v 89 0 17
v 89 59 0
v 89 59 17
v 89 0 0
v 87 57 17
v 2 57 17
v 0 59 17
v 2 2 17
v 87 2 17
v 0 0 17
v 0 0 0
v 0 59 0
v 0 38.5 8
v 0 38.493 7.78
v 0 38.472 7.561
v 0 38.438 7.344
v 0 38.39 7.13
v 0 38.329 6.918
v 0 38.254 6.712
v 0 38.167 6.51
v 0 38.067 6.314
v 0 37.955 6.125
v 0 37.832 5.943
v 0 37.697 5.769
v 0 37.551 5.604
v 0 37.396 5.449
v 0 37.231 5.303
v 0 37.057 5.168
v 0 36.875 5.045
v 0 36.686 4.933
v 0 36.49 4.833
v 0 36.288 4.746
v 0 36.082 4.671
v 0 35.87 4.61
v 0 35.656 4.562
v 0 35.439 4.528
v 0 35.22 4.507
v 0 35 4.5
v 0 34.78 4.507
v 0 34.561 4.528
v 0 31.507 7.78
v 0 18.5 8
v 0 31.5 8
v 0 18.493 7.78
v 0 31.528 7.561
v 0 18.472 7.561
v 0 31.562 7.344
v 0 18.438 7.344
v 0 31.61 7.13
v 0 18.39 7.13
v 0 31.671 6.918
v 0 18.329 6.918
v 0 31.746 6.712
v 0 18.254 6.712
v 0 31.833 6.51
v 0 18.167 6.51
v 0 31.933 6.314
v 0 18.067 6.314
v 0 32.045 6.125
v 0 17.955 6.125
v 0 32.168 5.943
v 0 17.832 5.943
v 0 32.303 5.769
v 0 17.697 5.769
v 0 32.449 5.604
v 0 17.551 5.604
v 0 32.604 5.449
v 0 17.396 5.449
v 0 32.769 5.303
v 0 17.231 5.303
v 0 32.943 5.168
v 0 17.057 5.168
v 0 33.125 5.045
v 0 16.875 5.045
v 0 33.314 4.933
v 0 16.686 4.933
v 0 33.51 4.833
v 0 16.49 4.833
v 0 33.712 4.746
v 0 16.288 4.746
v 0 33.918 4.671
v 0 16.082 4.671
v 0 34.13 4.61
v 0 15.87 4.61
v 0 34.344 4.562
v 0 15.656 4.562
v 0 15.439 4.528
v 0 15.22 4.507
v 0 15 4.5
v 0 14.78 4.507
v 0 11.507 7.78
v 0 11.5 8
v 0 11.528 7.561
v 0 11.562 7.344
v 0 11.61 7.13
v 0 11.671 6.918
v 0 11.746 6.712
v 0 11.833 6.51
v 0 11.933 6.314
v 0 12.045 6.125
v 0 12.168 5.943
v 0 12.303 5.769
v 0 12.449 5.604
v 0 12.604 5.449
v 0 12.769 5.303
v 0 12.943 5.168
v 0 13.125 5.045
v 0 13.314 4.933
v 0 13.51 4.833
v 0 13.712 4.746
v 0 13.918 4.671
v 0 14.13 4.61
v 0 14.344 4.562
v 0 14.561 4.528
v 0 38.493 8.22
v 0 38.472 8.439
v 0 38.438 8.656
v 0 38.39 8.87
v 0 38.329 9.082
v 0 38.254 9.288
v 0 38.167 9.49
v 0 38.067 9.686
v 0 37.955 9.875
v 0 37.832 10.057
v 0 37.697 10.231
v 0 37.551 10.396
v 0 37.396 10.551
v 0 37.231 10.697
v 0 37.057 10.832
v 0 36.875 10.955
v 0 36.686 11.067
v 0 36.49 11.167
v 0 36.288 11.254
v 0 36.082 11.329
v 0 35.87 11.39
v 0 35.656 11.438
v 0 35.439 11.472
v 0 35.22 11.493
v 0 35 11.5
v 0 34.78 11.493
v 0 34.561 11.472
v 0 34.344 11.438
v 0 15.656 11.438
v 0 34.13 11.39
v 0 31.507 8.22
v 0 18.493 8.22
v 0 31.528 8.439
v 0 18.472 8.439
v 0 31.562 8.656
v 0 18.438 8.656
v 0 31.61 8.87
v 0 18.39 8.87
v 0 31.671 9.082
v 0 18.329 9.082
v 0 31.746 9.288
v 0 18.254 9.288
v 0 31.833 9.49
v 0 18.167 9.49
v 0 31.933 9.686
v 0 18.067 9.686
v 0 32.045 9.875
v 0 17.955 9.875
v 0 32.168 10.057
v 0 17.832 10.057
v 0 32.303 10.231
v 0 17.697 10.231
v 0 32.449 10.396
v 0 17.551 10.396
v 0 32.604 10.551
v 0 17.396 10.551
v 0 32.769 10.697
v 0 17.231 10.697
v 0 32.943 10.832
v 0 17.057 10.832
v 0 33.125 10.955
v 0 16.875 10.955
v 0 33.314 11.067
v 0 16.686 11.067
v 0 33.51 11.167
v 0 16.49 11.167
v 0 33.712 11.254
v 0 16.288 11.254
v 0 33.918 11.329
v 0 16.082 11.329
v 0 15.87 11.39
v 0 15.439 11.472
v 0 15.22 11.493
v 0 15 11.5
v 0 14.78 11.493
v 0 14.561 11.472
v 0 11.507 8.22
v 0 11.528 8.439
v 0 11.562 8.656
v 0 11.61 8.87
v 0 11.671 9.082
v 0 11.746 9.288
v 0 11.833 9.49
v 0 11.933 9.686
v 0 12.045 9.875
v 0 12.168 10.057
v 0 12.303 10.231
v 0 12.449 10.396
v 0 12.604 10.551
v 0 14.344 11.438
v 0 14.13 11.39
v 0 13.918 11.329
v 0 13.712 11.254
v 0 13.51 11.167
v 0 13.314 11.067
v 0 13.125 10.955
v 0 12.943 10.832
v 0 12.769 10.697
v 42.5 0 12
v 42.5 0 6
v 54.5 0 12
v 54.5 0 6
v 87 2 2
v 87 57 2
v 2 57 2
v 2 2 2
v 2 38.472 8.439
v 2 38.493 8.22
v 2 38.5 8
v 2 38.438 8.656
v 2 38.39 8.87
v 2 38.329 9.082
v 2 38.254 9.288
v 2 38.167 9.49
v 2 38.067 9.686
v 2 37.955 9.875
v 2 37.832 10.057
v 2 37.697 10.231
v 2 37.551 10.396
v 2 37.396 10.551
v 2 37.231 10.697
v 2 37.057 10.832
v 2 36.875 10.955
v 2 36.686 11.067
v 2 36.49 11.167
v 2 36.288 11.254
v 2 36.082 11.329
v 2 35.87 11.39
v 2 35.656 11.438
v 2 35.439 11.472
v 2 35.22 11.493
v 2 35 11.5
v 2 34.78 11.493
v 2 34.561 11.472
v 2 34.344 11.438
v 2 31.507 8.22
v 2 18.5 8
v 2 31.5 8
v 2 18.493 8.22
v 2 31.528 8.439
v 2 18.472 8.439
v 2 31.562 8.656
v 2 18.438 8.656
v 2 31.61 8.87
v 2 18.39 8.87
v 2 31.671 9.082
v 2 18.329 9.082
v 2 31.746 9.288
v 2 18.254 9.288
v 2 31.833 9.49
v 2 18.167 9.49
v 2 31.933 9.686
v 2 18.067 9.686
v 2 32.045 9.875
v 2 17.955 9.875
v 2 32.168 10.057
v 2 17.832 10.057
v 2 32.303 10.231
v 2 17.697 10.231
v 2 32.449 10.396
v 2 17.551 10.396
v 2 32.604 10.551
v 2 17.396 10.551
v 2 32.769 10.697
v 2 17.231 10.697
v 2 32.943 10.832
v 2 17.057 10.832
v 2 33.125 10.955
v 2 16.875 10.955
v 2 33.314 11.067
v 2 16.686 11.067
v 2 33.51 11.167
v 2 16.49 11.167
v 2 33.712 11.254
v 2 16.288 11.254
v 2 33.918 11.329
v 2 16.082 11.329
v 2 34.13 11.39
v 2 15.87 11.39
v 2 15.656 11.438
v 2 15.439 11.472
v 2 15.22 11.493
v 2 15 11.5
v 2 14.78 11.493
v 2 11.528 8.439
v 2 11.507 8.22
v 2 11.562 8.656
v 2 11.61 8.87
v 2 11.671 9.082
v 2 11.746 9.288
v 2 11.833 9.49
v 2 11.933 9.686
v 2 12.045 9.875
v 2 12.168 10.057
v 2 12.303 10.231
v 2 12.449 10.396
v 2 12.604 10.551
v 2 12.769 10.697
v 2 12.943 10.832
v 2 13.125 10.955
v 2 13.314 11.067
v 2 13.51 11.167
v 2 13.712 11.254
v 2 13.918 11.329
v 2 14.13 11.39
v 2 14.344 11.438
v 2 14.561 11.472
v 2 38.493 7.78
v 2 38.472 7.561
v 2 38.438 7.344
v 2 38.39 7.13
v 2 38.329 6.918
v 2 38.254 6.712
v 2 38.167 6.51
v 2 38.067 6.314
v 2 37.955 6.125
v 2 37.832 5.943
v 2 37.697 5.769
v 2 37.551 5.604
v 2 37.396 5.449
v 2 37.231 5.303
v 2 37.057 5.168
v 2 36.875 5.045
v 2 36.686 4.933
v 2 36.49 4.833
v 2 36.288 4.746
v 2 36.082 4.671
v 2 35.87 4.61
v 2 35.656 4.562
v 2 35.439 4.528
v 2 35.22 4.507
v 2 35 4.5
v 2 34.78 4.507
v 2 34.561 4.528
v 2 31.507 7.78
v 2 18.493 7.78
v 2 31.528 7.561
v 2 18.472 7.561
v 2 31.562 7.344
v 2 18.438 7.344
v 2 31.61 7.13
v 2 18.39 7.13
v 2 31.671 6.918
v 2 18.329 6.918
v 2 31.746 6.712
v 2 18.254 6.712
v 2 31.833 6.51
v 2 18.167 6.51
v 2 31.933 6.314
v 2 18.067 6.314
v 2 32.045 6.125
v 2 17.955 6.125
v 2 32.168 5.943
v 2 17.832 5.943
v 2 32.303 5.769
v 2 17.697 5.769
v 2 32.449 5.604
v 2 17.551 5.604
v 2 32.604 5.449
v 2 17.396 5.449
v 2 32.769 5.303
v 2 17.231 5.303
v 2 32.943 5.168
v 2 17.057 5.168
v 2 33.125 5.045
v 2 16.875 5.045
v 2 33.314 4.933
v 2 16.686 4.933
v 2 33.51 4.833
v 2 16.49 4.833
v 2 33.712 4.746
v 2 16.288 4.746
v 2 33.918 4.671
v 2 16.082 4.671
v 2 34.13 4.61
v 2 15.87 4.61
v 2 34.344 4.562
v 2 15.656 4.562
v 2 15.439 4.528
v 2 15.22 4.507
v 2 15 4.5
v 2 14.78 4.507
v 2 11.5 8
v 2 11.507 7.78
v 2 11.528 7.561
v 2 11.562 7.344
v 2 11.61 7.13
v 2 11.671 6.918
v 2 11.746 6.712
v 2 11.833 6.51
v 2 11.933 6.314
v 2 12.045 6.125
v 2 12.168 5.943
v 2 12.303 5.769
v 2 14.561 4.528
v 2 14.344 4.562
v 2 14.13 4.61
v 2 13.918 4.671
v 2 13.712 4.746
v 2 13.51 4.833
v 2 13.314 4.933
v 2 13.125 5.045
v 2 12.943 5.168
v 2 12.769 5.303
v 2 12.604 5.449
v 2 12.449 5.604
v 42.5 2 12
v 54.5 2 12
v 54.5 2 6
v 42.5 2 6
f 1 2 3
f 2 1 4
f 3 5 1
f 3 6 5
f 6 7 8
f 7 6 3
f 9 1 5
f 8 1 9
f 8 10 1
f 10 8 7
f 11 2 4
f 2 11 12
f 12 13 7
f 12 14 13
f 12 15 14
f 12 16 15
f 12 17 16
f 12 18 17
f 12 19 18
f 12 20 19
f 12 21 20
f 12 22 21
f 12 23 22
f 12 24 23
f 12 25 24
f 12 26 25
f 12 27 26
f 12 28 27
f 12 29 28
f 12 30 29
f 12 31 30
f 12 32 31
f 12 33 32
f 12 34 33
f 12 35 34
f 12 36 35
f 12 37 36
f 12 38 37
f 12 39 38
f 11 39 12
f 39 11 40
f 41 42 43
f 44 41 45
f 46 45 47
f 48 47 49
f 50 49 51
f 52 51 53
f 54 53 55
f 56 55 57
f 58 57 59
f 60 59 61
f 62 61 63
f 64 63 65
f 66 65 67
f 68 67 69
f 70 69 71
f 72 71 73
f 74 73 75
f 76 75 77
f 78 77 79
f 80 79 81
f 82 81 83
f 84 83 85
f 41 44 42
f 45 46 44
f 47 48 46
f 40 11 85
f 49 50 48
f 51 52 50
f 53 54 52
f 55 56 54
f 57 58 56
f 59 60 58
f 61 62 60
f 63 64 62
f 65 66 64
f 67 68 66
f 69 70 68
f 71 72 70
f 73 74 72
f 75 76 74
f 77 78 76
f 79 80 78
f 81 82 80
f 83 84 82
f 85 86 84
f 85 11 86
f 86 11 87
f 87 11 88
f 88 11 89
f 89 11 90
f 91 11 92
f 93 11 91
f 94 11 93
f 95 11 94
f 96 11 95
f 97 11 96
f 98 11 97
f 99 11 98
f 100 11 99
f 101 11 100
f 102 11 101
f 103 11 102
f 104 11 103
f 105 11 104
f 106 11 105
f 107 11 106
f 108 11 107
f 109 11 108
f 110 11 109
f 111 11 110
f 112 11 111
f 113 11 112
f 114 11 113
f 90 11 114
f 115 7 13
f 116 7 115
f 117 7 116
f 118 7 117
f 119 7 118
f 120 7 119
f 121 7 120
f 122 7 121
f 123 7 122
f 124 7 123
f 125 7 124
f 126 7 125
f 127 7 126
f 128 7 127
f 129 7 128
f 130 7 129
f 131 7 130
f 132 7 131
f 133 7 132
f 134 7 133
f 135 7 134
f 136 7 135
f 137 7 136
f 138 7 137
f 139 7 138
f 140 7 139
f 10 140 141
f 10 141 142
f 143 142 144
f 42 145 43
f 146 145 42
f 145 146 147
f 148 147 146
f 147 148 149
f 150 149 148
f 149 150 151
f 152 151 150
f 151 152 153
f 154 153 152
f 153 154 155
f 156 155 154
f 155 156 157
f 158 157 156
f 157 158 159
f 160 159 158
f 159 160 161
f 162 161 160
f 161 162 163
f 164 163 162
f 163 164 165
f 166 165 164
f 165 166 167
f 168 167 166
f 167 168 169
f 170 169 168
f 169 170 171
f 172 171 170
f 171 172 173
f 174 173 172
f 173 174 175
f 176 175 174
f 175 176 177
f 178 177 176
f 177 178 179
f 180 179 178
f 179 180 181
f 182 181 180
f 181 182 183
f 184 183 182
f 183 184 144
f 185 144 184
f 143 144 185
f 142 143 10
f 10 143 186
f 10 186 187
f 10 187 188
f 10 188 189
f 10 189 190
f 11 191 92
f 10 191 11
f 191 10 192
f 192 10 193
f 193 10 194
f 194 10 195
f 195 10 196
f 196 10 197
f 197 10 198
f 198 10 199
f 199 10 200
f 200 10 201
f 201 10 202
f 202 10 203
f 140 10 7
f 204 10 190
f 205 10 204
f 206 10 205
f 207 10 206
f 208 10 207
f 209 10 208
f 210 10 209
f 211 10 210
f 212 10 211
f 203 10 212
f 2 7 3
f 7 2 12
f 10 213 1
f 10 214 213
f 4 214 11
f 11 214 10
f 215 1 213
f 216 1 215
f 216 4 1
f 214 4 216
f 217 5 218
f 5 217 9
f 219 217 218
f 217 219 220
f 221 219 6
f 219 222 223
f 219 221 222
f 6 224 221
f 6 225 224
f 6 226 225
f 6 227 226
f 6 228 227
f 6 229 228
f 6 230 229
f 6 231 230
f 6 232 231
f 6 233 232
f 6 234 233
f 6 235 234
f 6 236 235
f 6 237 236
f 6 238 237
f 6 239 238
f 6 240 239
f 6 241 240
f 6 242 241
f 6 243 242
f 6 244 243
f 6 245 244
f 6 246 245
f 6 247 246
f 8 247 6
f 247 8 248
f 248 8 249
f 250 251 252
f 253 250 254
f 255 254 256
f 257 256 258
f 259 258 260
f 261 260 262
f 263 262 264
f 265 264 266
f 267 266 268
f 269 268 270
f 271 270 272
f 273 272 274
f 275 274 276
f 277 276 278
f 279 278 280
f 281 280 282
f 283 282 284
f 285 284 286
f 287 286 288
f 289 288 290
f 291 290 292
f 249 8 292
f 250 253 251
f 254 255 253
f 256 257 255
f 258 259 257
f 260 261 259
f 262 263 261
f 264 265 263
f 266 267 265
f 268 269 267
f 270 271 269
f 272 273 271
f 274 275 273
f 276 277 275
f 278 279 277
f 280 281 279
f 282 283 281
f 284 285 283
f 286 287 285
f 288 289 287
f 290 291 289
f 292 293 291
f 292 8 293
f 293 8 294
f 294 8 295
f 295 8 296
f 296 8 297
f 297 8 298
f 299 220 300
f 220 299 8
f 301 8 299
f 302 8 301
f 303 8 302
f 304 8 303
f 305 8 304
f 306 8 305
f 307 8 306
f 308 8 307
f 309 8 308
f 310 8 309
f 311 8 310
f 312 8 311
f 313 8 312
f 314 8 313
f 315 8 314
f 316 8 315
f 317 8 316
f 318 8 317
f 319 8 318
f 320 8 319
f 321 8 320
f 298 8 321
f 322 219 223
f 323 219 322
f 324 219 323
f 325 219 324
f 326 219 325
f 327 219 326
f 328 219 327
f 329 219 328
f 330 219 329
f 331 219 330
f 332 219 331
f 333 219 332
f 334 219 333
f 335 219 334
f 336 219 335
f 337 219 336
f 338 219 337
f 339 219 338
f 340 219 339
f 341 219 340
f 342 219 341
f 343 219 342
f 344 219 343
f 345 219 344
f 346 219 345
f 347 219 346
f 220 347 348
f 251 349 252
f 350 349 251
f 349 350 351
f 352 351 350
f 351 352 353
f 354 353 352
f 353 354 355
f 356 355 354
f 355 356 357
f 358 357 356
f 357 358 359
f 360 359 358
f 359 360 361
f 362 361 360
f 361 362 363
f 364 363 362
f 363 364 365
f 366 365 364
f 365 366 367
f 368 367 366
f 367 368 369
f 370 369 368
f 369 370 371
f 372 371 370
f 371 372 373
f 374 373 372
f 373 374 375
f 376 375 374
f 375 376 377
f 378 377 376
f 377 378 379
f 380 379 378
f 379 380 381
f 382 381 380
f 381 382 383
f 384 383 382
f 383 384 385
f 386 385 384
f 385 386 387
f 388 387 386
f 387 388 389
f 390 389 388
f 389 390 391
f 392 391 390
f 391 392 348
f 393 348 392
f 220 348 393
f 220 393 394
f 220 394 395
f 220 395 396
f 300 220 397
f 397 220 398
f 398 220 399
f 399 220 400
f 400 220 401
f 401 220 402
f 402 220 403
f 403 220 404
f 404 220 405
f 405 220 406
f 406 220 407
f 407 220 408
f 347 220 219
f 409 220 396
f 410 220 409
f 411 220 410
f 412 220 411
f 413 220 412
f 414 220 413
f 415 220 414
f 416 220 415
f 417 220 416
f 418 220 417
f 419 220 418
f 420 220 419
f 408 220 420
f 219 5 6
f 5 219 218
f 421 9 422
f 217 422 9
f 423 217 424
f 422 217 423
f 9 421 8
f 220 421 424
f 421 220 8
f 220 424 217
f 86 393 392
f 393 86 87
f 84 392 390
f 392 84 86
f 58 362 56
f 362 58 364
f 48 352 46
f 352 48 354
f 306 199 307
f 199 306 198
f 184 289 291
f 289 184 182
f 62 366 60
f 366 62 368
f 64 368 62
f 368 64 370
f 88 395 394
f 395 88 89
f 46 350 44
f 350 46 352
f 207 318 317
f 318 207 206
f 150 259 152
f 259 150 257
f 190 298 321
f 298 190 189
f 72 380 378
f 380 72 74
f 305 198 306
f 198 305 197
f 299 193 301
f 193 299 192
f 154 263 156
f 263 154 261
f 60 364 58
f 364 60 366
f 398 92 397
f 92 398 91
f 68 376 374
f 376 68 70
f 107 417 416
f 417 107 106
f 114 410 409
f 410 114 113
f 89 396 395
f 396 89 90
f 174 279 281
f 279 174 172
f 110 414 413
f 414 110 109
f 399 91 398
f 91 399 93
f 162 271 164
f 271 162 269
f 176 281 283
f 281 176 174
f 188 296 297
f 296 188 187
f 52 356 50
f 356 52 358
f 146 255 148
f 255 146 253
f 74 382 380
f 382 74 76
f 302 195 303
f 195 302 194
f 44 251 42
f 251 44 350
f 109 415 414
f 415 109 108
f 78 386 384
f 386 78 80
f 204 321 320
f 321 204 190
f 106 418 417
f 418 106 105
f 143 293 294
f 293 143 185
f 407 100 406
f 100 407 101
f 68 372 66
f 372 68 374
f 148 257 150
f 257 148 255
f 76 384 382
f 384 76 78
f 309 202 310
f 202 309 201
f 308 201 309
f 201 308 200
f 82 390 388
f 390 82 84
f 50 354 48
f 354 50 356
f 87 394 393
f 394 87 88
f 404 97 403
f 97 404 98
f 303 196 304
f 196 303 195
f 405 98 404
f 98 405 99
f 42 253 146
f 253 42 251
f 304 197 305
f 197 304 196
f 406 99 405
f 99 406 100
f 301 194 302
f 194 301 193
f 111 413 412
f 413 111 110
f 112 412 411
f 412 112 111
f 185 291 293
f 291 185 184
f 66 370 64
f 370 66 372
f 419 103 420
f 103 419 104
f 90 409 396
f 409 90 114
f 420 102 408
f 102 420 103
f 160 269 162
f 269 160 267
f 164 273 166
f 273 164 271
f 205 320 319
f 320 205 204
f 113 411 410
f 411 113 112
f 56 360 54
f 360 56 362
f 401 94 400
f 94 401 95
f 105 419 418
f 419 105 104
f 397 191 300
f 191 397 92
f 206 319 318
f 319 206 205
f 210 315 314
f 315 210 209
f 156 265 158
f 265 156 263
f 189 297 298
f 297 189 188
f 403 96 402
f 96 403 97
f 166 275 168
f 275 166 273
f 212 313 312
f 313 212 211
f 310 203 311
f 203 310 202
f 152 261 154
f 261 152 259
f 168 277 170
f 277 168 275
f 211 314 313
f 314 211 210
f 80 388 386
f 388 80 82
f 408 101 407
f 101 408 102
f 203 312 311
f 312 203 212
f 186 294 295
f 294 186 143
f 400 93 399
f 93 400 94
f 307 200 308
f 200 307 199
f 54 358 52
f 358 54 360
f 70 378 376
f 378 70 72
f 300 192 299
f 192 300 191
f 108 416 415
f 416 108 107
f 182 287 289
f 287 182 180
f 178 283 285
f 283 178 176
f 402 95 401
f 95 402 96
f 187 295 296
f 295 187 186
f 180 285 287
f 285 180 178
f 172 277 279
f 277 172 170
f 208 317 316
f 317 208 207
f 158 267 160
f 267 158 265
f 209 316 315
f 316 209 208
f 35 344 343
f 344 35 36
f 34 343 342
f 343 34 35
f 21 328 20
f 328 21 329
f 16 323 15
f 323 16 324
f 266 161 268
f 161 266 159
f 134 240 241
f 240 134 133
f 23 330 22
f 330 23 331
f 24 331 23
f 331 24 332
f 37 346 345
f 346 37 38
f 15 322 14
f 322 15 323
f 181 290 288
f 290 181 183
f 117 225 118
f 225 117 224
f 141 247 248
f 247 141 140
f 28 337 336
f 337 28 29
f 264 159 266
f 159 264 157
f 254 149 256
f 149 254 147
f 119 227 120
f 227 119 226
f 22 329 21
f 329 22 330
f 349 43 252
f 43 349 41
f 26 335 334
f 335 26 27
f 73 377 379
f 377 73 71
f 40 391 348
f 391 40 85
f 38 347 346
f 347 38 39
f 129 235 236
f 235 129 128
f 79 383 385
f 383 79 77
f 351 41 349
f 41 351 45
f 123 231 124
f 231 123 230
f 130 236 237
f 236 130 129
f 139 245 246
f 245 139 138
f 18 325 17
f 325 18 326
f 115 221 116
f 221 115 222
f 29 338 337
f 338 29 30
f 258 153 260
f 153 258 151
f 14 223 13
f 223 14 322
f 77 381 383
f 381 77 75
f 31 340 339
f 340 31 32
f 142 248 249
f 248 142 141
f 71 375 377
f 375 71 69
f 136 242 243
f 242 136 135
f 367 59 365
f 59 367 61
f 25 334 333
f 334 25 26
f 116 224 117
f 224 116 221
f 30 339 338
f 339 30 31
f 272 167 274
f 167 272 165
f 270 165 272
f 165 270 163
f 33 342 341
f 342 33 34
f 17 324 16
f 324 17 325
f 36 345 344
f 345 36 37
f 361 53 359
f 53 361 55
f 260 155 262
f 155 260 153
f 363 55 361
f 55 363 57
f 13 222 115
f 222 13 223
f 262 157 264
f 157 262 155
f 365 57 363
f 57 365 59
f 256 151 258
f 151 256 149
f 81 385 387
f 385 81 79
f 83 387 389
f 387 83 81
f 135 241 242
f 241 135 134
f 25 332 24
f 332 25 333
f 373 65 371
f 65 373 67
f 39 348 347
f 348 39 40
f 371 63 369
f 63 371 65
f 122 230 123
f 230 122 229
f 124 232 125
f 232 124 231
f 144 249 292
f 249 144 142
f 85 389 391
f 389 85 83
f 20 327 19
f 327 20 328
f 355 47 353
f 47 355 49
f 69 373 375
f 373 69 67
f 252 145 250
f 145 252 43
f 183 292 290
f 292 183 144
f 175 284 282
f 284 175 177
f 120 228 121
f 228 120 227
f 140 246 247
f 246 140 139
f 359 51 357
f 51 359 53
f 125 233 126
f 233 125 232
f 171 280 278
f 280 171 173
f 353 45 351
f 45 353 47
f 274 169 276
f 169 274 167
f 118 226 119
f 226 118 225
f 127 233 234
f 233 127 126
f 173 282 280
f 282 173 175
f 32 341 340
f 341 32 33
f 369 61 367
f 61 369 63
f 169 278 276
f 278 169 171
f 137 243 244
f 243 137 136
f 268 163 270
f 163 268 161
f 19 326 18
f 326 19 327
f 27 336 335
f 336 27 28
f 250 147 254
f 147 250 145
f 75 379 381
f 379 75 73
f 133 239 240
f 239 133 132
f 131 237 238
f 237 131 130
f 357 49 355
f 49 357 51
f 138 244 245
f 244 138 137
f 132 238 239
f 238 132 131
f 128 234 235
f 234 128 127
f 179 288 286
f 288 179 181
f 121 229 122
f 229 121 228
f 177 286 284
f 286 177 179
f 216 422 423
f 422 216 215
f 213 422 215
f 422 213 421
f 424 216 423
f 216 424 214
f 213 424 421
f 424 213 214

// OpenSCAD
// SPDX-FileCopyrightText: 2026 Direct-RF Transceiver Project
// SPDX-License-Identifier: Apache-2.0
// OpenSCAD 3D Enclosure Model for Caravel Direct-RF Development Board

$fn = 100;

// Enclosure Dimensions
wall_thickness = 2.0;
board_width = 85.0;
board_length = 55.0;
board_height = 15.0;

module base_enclosure() {
    difference() {
        // Outer Shell
        cube([board_width + 2*wall_thickness, board_length + 2*wall_thickness, board_height + wall_thickness]);
        
        // Inner Cavity
        translate([wall_thickness, wall_thickness, wall_thickness])
            cube([board_width, board_length, board_height + 1.0]);
            
        // SMA Connector Port Cutouts for RF I/Q Signals
        translate([-1.0, 15.0, 8.0])
            rotate([0, 90, 0])
                cylinder(r=3.5, h=wall_thickness + 2.0);
                
        translate([-1.0, 35.0, 8.0])
            rotate([0, 90, 0])
                cylinder(r=3.5, h=wall_thickness + 2.0);
                
        // USB-C Power/Telemetry Port Cutout
        translate([board_width/2, -1.0, 6.0])
            cube([12.0, wall_thickness + 2.0, 6.0]);
    }
}

base_enclosure();
